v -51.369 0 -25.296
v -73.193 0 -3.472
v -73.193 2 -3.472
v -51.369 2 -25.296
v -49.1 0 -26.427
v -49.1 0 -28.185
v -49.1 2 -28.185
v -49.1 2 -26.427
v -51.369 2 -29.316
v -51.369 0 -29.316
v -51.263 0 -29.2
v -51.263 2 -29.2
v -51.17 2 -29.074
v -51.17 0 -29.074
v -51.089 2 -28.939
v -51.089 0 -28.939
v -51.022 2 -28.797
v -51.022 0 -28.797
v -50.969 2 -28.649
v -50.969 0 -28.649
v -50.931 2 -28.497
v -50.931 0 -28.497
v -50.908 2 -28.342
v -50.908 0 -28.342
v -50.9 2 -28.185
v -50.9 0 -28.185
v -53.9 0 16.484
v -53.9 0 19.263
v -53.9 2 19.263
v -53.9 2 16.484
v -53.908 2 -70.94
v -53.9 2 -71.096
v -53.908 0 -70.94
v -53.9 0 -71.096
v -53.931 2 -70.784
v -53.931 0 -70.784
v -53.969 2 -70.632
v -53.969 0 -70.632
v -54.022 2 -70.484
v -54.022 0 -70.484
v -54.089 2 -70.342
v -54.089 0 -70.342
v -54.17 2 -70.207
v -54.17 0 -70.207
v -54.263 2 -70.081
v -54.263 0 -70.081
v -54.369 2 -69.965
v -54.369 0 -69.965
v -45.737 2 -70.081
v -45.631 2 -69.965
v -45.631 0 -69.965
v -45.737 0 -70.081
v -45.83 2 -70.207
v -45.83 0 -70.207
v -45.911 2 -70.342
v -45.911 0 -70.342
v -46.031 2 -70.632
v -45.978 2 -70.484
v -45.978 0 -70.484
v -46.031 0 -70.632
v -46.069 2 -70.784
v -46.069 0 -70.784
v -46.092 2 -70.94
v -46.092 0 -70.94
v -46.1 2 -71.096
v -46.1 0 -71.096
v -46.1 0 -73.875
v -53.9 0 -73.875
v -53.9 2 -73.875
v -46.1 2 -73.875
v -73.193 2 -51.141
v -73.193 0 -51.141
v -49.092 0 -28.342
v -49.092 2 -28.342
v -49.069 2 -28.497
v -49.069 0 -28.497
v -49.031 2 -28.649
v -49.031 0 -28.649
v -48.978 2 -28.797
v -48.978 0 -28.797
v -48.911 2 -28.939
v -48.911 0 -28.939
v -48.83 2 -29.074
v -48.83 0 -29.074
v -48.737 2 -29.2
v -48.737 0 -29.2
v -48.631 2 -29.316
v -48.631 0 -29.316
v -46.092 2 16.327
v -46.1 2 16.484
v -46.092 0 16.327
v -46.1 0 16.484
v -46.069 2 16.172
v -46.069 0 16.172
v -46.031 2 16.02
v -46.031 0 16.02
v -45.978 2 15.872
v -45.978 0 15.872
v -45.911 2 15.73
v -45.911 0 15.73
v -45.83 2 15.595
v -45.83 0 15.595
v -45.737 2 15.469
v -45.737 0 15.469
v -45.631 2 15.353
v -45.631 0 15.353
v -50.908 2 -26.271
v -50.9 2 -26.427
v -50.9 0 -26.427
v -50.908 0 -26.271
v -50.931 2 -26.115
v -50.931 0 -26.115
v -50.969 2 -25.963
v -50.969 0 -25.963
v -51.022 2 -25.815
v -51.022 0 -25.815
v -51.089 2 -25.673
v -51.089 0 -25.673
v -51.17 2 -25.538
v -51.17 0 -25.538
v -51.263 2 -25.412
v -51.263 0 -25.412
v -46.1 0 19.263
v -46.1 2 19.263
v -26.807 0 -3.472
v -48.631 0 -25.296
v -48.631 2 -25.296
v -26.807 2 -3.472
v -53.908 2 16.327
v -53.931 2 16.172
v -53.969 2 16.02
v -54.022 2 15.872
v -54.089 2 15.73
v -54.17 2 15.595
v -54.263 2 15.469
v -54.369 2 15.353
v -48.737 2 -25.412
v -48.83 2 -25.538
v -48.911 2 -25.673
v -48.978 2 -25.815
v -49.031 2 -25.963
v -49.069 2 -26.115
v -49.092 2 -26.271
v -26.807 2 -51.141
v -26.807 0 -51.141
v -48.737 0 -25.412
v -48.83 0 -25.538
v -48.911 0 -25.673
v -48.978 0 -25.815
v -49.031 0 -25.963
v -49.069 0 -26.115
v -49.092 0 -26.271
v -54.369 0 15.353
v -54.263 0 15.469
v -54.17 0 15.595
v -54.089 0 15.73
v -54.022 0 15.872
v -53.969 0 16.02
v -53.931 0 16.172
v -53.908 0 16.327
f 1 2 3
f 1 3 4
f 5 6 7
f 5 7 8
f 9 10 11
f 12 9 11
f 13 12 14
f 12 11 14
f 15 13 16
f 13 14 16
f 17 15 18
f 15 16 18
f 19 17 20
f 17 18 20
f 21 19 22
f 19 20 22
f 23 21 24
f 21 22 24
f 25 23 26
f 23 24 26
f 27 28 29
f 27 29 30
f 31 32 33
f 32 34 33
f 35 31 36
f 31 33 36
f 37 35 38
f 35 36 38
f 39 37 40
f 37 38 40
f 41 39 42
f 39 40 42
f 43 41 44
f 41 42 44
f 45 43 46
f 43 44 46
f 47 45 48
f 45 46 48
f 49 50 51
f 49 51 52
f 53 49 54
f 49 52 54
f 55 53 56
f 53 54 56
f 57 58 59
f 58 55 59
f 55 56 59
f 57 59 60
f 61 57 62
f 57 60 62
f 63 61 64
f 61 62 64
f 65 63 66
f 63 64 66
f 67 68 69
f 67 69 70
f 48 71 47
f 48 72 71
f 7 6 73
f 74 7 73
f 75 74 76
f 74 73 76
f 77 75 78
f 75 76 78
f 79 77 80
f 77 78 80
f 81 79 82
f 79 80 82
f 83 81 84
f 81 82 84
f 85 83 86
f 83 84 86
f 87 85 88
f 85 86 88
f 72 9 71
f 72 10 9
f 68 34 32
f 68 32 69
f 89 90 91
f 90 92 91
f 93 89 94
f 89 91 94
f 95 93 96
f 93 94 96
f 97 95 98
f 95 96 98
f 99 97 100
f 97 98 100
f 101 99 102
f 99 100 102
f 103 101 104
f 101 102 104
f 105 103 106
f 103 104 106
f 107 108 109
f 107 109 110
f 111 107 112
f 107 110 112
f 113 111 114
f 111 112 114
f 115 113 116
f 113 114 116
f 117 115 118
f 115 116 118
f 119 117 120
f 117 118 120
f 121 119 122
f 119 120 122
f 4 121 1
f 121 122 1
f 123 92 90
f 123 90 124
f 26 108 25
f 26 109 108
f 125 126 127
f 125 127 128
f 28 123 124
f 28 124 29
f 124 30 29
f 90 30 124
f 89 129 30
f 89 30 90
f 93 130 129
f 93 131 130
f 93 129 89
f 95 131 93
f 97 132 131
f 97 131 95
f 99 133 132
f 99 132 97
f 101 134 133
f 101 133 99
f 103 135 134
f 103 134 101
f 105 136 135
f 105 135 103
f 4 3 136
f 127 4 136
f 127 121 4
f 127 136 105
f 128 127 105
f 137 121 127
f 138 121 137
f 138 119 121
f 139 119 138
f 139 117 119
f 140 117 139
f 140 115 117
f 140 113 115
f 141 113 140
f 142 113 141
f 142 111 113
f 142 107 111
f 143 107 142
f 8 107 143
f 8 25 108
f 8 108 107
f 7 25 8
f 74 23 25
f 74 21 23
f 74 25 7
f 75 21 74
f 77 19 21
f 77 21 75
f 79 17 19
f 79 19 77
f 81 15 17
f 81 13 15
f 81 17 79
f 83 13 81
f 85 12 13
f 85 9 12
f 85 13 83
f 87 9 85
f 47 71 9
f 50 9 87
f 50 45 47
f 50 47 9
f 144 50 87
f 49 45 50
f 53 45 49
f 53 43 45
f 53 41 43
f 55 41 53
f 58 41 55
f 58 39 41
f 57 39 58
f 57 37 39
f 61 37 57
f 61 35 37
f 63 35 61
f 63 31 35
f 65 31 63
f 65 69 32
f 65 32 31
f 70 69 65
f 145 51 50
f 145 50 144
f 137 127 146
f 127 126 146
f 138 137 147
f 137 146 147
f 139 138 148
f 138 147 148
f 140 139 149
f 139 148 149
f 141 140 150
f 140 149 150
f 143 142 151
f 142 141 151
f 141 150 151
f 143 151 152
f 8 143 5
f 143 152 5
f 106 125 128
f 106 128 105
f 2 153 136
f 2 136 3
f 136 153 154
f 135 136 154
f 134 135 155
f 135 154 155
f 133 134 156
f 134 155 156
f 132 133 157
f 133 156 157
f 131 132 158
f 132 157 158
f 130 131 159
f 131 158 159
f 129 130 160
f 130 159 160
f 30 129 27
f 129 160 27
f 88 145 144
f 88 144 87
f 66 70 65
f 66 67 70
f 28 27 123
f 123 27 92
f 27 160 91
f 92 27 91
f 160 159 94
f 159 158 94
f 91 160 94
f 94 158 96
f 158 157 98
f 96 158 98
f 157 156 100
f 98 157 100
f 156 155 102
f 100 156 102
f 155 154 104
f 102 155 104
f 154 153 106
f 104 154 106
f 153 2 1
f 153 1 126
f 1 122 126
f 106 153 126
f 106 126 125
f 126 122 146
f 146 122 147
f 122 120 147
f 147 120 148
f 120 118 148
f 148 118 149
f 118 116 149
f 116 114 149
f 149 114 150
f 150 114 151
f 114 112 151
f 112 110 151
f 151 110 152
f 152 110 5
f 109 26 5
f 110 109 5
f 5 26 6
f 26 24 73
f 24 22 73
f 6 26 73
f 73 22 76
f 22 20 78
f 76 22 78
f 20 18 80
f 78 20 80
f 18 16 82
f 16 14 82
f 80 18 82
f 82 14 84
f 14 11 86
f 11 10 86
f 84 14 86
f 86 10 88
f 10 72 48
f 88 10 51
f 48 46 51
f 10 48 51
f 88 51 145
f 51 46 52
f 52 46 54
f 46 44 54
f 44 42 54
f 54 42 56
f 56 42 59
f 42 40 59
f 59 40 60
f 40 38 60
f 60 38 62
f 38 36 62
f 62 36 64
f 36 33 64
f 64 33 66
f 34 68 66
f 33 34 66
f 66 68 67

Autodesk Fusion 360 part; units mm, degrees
sketch "back" plane through (0, 0, 0) normal (0, 1, 0) x (1, 0, 0)
  arc A0 (-49, 26.4274) -> (-48.5607, 25.3667) centre (-47.5, 26.4274) ccw
  line L0 (-46, -19.363) -> (-54, -19.363)
  line L1 (-54.4393, -15.4237) -> (-73.3345, 3.4715)
  arc A1 (-48.5607, 29.2454) -> (-49, 28.1847) centre (-47.5, 28.1847) ccw
  line L2 (-48.5607, 25.3667) -> (-26.6655, 3.4715)
  arc A2 (-54, -16.4843) -> (-54.4393, -15.4237) centre (-55.5, -16.4843) ccw
  arc A3 (-51.4393, 25.3667) -> (-51, 26.4274) centre (-52.5, 26.4274) ccw
  arc A4 (-54.4393, 70.0358) -> (-54, 71.0964) centre (-55.5, 71.0964) ccw
  line L3 (-73.1931, 51.1406) -> (-54.3686, 69.965)
  arc A5 (-54.3686, 69.965) -> (-53.9, 71.0964) centre (-55.5, 71.0964) ccw
  line L4 (-53.9, -19.263) -> (-53.9, -16.4843)
  line L5 (-45.5607, 70.0358) -> (-26.6655, 51.1406)
  line L6 (-51, 26.4274) -> (-51, 28.1847)
  line L7 (-46.1, 73.8751) -> (-46.1, 71.0964)
  line L8 (-46.1, -16.4843) -> (-46.1, -19.263)
  arc A6 (-46, 71.0964) -> (-45.5607, 70.0358) centre (-44.5, 71.0964) ccw
  arc A7 (-45.5607, -15.4237) -> (-46, -16.4843) centre (-44.5, -16.4843) ccw
  line L9 (-54, 71.0964) -> (-54, 73.9751)
  arc A8 (-51, 28.1847) -> (-51.4393, 29.2454) centre (-52.5, 28.1847) ccw
  line L10 (-46, 73.9751) -> (-46, 71.0964)
  line L11 (-26.6655, 3.4715) -> (-45.5607, -15.4237)
  line L12 (-45.6314, 69.965) -> (-26.8069, 51.1406)
  arc A9 (-50.9, 28.1847) -> (-51.3686, 29.3161) centre (-52.5, 28.1847) ccw
  line L13 (-46, -16.4843) -> (-46, -19.363)
  line L14 (-54, -19.363) -> (-54, -16.4843)
  line L15 (-54, 73.9751) -> (-46, 73.9751)
  line L16 (-26.6655, 51.1406) -> (-48.5607, 29.2454)
  line L17 (-51.4393, 29.2454) -> (-73.3345, 51.1406)
  line L18 (-54.3686, -15.353) -> (-73.1931, 3.4715)
  arc A10 (-48.6314, 29.3161) -> (-49.1, 28.1847) centre (-47.5, 28.1847) ccw
  line L19 (-73.3345, 3.4715) -> (-51.4393, 25.3667)
  arc A11 (-51.3686, 25.296) -> (-50.9, 26.4274) centre (-52.5, 26.4274) ccw
  arc A12 (-49.1, 26.4274) -> (-48.6314, 25.296) centre (-47.5, 26.4274) ccw
  line L20 (-50.9, 26.4274) -> (-50.9, 28.1847)
  line L21 (-73.3345, 51.1406) -> (-54.4393, 70.0358)
  line L22 (-53.9, 71.0964) -> (-53.9, 73.8751)
  line L23 (-49, 28.1847) -> (-49, 26.4274)
  arc A13 (-46.1, 71.0964) -> (-45.6314, 69.965) centre (-44.5, 71.0964) ccw
  line L24 (-49.1, 28.1847) -> (-49.1, 26.4274)
  arc A14 (-45.6314, -15.353) -> (-46.1, -16.4843) centre (-44.5, -16.4843) ccw
  line L25 (-26.8069, 3.4715) -> (-45.6314, -15.353)
  arc A15 (-53.9, -16.4843) -> (-54.3686, -15.353) centre (-55.5, -16.4843) ccw
  line L26 (-26.8069, 51.1406) -> (-48.6314, 29.3161)
  line L27 (-73.1931, 3.4715) -> (-51.3686, 25.296)
  line L28 (-51.3686, 29.3161) -> (-73.1931, 51.1406)
  line L29 (-48.6314, 25.296) -> (-26.8069, 3.4715)
  line L30 (-46.1, -19.263) -> (-53.9, -19.263)
  line L31 (-53.9, 73.8751) -> (-46.1, 73.8751)
extrude "Extrude1" add sketch "back" along normal blind 2 contours L3 A5 L4 L7 L8 L12 A9 L18 A10 A11 A12 L20 L22 A13 L24 A14 L25 A15 L26 L27 L28 L29 L30 L31
